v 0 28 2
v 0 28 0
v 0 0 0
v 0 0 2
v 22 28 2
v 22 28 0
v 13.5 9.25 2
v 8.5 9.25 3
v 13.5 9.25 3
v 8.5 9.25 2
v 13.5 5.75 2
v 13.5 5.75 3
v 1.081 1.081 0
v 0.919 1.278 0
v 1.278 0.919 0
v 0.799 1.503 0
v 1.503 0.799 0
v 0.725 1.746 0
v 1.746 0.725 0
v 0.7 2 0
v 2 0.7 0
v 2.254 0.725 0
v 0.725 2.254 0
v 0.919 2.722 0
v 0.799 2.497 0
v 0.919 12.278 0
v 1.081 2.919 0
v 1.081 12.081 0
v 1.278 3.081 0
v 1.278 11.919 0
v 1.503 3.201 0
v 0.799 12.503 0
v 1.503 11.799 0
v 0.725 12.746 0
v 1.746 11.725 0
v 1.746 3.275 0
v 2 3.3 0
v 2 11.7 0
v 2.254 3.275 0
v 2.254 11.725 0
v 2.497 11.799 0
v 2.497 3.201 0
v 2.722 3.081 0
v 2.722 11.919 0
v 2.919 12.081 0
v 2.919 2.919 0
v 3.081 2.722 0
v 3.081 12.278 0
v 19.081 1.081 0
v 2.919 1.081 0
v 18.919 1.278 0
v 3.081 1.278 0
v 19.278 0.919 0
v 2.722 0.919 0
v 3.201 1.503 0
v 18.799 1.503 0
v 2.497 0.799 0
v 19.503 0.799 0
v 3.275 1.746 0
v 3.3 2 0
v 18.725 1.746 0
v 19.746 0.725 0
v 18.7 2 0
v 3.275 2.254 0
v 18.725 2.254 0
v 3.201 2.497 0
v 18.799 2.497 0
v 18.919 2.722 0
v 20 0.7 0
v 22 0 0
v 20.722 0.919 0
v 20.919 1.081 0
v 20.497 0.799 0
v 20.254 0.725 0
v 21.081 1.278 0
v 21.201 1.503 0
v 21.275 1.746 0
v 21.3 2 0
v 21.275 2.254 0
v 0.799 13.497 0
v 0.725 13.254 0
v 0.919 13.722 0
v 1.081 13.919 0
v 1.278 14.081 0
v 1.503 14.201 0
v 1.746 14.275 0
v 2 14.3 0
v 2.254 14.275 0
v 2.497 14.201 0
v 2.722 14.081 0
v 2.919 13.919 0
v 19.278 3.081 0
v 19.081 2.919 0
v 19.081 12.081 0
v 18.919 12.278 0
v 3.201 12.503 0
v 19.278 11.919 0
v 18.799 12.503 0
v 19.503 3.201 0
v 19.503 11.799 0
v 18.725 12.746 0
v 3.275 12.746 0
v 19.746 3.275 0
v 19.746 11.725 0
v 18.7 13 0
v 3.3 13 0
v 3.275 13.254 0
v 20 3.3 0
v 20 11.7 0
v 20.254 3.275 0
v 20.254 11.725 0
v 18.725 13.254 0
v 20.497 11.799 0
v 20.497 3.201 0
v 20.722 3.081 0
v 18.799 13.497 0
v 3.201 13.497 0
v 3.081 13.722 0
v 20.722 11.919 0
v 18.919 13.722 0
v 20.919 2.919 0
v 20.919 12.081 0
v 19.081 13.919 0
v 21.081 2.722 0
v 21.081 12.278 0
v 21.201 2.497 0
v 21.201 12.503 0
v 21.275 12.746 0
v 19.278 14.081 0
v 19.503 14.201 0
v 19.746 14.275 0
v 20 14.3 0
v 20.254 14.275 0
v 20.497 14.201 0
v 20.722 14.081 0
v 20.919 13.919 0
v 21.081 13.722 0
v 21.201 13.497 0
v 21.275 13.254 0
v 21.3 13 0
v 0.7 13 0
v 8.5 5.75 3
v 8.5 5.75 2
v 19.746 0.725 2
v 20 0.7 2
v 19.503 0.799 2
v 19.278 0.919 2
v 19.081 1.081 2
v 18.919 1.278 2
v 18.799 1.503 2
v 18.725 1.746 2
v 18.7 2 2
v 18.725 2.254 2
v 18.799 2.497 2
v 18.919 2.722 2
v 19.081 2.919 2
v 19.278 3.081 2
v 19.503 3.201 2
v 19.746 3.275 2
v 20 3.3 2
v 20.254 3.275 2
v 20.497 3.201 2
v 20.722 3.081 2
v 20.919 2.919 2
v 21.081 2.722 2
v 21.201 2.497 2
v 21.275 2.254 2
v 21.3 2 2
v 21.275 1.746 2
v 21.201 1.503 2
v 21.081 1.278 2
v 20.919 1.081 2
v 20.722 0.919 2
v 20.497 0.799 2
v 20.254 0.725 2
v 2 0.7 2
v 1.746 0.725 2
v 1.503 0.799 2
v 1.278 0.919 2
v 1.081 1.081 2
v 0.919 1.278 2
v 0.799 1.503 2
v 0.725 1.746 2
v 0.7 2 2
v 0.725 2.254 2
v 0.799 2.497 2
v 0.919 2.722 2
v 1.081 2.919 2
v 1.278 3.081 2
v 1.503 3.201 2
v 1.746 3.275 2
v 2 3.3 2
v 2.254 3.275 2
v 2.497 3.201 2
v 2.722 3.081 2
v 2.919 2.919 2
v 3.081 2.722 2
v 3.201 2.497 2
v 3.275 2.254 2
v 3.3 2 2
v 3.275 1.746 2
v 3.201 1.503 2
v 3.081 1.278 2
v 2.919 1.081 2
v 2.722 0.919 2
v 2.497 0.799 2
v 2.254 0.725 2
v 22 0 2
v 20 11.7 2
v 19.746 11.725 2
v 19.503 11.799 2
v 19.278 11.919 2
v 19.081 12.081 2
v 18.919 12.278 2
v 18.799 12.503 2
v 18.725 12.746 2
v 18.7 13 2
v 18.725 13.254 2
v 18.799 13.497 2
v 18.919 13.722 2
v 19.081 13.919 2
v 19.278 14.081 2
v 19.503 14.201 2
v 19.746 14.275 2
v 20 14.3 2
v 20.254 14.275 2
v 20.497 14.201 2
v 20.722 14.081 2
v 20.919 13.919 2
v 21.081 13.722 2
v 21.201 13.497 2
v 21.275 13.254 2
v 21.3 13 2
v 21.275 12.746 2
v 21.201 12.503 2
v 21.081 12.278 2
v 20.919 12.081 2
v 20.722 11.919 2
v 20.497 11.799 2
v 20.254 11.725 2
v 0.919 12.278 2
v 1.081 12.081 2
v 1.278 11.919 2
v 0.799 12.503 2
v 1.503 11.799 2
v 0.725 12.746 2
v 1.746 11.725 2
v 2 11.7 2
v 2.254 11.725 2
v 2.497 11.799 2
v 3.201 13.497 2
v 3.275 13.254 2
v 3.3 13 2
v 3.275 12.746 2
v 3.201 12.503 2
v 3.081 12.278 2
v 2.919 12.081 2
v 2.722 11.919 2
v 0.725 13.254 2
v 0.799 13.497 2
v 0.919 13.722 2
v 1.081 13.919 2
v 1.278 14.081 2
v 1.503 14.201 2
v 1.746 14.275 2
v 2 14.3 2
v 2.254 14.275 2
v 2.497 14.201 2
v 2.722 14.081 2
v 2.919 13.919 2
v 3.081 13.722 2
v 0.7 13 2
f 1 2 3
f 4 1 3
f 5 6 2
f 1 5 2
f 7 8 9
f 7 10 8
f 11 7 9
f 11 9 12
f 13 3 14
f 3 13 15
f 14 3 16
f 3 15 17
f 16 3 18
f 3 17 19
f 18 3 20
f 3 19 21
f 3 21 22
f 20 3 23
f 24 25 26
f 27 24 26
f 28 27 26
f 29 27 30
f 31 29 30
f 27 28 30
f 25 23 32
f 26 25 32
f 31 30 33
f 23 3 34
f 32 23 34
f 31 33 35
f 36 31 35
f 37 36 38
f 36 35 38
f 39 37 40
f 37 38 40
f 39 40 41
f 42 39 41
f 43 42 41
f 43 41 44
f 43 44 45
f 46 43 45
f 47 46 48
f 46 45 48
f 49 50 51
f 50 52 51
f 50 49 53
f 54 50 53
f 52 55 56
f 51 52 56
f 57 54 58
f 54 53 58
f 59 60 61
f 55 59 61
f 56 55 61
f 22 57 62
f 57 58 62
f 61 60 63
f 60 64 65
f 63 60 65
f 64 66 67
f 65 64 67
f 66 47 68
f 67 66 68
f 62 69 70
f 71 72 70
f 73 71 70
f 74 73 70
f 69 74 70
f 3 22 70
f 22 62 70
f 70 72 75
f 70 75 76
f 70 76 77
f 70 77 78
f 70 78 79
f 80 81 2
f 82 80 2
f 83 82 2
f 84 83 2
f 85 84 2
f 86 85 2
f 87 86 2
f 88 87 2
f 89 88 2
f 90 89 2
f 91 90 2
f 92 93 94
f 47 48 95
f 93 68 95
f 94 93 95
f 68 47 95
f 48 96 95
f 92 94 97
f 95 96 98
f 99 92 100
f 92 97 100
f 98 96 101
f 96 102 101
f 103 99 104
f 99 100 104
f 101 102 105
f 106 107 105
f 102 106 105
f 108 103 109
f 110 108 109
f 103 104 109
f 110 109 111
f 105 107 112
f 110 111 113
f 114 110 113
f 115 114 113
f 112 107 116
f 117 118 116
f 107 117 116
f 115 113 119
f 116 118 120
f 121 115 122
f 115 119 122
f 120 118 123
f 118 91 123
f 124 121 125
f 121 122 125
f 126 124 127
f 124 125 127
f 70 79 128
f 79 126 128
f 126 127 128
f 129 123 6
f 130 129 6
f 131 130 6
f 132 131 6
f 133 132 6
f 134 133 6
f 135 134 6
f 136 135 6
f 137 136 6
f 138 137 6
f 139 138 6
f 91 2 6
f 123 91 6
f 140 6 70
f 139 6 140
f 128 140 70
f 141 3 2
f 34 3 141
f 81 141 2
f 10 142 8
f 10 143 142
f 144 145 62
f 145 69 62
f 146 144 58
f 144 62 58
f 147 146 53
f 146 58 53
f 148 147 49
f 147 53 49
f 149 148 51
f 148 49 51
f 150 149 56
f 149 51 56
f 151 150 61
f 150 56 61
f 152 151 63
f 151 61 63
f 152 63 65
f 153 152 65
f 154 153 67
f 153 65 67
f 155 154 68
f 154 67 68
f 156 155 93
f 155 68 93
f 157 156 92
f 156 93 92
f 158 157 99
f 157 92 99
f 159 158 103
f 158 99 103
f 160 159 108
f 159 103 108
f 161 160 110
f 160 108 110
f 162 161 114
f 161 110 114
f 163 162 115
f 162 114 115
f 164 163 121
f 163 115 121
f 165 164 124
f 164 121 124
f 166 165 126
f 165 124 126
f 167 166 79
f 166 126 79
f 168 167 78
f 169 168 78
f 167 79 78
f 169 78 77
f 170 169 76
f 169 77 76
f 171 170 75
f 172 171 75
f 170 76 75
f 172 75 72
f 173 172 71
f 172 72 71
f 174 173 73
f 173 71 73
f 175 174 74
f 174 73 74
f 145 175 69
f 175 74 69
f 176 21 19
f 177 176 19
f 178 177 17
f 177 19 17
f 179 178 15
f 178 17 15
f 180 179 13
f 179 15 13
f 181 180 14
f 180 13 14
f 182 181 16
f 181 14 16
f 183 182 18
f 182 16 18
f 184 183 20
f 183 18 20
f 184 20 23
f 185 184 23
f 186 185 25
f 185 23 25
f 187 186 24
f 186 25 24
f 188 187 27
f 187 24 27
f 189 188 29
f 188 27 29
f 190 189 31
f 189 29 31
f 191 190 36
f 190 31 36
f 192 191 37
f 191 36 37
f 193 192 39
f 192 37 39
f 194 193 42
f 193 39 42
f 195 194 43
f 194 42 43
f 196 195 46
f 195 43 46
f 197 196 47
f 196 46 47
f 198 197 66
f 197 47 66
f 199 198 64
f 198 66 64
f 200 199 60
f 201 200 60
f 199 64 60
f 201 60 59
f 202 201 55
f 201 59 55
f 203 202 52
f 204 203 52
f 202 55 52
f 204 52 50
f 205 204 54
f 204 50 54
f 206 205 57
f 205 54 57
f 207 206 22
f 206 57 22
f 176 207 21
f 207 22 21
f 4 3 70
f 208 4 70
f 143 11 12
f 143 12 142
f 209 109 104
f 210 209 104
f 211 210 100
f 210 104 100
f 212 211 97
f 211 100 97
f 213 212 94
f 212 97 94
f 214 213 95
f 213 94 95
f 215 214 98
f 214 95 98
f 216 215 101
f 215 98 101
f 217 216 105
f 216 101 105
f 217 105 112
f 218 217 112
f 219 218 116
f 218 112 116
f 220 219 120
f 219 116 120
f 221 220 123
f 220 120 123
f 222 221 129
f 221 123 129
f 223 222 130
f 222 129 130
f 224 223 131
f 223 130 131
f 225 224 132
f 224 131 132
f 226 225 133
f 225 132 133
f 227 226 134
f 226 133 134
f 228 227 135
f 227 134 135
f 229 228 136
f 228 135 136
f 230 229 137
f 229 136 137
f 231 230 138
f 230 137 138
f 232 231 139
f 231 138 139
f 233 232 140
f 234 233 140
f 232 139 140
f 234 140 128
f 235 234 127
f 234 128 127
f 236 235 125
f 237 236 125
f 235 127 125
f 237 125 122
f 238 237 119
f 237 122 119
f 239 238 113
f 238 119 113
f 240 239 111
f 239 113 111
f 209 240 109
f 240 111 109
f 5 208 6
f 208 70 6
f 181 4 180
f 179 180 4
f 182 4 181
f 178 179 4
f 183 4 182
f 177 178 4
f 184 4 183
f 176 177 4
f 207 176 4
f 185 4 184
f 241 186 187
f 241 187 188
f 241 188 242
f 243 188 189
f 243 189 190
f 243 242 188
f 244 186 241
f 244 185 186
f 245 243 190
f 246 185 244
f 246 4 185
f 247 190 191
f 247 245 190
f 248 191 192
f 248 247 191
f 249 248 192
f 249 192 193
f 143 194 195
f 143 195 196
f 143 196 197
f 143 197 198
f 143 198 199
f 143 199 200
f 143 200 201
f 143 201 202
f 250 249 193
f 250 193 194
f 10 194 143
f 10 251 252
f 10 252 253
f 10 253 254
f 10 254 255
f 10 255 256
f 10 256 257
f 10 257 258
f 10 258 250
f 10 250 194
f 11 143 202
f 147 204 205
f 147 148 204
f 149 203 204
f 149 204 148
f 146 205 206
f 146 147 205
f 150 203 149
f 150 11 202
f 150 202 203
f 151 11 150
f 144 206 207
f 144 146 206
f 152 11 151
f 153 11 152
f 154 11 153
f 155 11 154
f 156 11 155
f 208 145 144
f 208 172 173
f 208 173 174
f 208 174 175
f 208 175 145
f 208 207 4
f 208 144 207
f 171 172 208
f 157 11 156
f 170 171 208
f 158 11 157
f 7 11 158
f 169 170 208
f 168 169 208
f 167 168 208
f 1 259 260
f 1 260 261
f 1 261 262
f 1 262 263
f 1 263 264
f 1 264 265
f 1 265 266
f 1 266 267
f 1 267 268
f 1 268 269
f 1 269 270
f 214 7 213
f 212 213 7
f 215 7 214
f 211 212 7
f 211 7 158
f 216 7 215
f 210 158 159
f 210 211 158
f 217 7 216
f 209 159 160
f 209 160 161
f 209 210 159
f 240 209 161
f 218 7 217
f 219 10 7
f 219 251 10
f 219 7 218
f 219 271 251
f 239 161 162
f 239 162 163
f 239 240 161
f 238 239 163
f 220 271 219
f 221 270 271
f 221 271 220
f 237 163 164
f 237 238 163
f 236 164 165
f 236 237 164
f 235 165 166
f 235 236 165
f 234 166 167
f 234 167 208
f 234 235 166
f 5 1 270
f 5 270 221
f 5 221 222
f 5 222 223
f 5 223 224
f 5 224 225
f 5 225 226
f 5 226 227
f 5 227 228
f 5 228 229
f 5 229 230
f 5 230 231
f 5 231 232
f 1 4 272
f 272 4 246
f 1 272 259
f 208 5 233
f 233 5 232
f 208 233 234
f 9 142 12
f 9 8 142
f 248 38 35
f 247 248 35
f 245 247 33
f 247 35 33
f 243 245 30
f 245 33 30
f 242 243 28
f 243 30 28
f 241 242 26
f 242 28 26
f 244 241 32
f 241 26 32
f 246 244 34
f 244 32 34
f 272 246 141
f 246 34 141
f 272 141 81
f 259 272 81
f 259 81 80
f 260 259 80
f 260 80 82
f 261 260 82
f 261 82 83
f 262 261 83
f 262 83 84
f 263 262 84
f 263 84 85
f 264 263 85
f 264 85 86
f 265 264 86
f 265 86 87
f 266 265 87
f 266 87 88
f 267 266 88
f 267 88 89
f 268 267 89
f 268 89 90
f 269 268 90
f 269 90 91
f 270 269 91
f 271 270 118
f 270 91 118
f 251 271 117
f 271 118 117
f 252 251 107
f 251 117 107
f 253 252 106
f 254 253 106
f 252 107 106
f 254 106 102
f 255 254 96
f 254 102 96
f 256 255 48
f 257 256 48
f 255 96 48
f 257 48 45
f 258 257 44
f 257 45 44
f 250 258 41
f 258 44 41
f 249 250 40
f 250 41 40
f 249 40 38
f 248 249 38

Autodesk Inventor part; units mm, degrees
ref_plane "YZ Plane" through (0, 0, 0) normal (1, 0, 0) x (0, 1, 0)
ref_plane "XZ Plane" through (0, 0, 0) normal (0, 1, 0) x (-1, 0, 0)
ref_plane "XY Plane" through (0, 0, 0) normal (0, 0, 1) x (1, 0, 0)
sketch "Sketch1" plane through (0, 0, 0) normal (0, 0, 1) x (1, 0, 0)
  line L0 (0, 0) -> (22, 0)
  line L1 (22, 0) -> (22, 28)
  line L2 (22, 28) -> (0, 28)
  line L3 (0, 28) -> (0, 0)
  dimension "d0" = 22
  dimension "d1" = 28
extrude "Extrusion1" add sketch "Sketch1" along normal blind 2
sketch "Sketch2" plane through (0, 0, 2) normal (0, 0, 1) x (1, 0, 0)
  line L0 (0, 0) -> (22, 0) projected
  line L1 (0, 28) -> (0, 0) projected
  point P0 (2, 2)
  dimension "d34" = 2
  dimension "d35" = 2
hole "Hole1" at (2, 2, 2) direction (0, 0, -1) diameter 2.6 end through all
sketch "Sketch3" plane through (0, 0, 2) normal (0, 0, 1) x (1, 0, 0)
  line L0 (22, 0) -> (22, 28) projected
  line L1 (0, 0) -> (22, 0) projected
  point P0 (20, 2)
  dimension "d32" = 2
  dimension "d33" = 2
hole "Hole2" at (20, 2, 2) direction (0, 0, -1) diameter 2.6 end through all
sketch "Sketch4" plane through (0, 0, 2) normal (0, 0, 1) x (1, 0, 0)
  circle A0 centre (2, 2) radius 1.3 projected
  line L0 (0, 28) -> (0, 0) projected
  point P0 (2, 13)
  dimension "d38" = 11
  dimension "d39" = 2
hole "Hole3" at (2, 13, 2) direction (0, 0, -1) diameter 2.6 end through all
sketch "Sketch5" plane through (0, 0, 2) normal (0, 0, 1) x (1, 0, 0)
  line L0 (22, 0) -> (22, 28) projected
  circle A0 centre (20, 2) radius 1.3 projected
  point P0 (0, 0)
  point P1 (20, 13)
  dimension "d36" = 2
  dimension "d37" = 11
hole "Hole4" at (20, 13, 2) direction (0, 0, -1) diameter 2.6 end through all
sketch "Sketch6" plane through (0, 0, 2) normal (0, 0, 1) x (1, 0, 0)
  line L0 (8.5, 9.25) -> (13.5, 9.25)
  line L1 (13.5, 9.25) -> (13.5, 5.75)
  line L2 (13.5, 5.75) -> (8.5, 5.75)
  line L3 (8.5, 5.75) -> (8.5, 9.25)
  line L4 (0, 0) -> (22, 0) projected
  line L5 (0, 28) -> (0, 0) projected
  dimension "d40" = 5
  dimension "d41" = 3.5
  dimension "d42" = 5.75
  dimension "d43" = 8.5
extrude "Extrusion2" add sketch "Sketch6" along normal blind 1
properties part number "angle hall sensor"
